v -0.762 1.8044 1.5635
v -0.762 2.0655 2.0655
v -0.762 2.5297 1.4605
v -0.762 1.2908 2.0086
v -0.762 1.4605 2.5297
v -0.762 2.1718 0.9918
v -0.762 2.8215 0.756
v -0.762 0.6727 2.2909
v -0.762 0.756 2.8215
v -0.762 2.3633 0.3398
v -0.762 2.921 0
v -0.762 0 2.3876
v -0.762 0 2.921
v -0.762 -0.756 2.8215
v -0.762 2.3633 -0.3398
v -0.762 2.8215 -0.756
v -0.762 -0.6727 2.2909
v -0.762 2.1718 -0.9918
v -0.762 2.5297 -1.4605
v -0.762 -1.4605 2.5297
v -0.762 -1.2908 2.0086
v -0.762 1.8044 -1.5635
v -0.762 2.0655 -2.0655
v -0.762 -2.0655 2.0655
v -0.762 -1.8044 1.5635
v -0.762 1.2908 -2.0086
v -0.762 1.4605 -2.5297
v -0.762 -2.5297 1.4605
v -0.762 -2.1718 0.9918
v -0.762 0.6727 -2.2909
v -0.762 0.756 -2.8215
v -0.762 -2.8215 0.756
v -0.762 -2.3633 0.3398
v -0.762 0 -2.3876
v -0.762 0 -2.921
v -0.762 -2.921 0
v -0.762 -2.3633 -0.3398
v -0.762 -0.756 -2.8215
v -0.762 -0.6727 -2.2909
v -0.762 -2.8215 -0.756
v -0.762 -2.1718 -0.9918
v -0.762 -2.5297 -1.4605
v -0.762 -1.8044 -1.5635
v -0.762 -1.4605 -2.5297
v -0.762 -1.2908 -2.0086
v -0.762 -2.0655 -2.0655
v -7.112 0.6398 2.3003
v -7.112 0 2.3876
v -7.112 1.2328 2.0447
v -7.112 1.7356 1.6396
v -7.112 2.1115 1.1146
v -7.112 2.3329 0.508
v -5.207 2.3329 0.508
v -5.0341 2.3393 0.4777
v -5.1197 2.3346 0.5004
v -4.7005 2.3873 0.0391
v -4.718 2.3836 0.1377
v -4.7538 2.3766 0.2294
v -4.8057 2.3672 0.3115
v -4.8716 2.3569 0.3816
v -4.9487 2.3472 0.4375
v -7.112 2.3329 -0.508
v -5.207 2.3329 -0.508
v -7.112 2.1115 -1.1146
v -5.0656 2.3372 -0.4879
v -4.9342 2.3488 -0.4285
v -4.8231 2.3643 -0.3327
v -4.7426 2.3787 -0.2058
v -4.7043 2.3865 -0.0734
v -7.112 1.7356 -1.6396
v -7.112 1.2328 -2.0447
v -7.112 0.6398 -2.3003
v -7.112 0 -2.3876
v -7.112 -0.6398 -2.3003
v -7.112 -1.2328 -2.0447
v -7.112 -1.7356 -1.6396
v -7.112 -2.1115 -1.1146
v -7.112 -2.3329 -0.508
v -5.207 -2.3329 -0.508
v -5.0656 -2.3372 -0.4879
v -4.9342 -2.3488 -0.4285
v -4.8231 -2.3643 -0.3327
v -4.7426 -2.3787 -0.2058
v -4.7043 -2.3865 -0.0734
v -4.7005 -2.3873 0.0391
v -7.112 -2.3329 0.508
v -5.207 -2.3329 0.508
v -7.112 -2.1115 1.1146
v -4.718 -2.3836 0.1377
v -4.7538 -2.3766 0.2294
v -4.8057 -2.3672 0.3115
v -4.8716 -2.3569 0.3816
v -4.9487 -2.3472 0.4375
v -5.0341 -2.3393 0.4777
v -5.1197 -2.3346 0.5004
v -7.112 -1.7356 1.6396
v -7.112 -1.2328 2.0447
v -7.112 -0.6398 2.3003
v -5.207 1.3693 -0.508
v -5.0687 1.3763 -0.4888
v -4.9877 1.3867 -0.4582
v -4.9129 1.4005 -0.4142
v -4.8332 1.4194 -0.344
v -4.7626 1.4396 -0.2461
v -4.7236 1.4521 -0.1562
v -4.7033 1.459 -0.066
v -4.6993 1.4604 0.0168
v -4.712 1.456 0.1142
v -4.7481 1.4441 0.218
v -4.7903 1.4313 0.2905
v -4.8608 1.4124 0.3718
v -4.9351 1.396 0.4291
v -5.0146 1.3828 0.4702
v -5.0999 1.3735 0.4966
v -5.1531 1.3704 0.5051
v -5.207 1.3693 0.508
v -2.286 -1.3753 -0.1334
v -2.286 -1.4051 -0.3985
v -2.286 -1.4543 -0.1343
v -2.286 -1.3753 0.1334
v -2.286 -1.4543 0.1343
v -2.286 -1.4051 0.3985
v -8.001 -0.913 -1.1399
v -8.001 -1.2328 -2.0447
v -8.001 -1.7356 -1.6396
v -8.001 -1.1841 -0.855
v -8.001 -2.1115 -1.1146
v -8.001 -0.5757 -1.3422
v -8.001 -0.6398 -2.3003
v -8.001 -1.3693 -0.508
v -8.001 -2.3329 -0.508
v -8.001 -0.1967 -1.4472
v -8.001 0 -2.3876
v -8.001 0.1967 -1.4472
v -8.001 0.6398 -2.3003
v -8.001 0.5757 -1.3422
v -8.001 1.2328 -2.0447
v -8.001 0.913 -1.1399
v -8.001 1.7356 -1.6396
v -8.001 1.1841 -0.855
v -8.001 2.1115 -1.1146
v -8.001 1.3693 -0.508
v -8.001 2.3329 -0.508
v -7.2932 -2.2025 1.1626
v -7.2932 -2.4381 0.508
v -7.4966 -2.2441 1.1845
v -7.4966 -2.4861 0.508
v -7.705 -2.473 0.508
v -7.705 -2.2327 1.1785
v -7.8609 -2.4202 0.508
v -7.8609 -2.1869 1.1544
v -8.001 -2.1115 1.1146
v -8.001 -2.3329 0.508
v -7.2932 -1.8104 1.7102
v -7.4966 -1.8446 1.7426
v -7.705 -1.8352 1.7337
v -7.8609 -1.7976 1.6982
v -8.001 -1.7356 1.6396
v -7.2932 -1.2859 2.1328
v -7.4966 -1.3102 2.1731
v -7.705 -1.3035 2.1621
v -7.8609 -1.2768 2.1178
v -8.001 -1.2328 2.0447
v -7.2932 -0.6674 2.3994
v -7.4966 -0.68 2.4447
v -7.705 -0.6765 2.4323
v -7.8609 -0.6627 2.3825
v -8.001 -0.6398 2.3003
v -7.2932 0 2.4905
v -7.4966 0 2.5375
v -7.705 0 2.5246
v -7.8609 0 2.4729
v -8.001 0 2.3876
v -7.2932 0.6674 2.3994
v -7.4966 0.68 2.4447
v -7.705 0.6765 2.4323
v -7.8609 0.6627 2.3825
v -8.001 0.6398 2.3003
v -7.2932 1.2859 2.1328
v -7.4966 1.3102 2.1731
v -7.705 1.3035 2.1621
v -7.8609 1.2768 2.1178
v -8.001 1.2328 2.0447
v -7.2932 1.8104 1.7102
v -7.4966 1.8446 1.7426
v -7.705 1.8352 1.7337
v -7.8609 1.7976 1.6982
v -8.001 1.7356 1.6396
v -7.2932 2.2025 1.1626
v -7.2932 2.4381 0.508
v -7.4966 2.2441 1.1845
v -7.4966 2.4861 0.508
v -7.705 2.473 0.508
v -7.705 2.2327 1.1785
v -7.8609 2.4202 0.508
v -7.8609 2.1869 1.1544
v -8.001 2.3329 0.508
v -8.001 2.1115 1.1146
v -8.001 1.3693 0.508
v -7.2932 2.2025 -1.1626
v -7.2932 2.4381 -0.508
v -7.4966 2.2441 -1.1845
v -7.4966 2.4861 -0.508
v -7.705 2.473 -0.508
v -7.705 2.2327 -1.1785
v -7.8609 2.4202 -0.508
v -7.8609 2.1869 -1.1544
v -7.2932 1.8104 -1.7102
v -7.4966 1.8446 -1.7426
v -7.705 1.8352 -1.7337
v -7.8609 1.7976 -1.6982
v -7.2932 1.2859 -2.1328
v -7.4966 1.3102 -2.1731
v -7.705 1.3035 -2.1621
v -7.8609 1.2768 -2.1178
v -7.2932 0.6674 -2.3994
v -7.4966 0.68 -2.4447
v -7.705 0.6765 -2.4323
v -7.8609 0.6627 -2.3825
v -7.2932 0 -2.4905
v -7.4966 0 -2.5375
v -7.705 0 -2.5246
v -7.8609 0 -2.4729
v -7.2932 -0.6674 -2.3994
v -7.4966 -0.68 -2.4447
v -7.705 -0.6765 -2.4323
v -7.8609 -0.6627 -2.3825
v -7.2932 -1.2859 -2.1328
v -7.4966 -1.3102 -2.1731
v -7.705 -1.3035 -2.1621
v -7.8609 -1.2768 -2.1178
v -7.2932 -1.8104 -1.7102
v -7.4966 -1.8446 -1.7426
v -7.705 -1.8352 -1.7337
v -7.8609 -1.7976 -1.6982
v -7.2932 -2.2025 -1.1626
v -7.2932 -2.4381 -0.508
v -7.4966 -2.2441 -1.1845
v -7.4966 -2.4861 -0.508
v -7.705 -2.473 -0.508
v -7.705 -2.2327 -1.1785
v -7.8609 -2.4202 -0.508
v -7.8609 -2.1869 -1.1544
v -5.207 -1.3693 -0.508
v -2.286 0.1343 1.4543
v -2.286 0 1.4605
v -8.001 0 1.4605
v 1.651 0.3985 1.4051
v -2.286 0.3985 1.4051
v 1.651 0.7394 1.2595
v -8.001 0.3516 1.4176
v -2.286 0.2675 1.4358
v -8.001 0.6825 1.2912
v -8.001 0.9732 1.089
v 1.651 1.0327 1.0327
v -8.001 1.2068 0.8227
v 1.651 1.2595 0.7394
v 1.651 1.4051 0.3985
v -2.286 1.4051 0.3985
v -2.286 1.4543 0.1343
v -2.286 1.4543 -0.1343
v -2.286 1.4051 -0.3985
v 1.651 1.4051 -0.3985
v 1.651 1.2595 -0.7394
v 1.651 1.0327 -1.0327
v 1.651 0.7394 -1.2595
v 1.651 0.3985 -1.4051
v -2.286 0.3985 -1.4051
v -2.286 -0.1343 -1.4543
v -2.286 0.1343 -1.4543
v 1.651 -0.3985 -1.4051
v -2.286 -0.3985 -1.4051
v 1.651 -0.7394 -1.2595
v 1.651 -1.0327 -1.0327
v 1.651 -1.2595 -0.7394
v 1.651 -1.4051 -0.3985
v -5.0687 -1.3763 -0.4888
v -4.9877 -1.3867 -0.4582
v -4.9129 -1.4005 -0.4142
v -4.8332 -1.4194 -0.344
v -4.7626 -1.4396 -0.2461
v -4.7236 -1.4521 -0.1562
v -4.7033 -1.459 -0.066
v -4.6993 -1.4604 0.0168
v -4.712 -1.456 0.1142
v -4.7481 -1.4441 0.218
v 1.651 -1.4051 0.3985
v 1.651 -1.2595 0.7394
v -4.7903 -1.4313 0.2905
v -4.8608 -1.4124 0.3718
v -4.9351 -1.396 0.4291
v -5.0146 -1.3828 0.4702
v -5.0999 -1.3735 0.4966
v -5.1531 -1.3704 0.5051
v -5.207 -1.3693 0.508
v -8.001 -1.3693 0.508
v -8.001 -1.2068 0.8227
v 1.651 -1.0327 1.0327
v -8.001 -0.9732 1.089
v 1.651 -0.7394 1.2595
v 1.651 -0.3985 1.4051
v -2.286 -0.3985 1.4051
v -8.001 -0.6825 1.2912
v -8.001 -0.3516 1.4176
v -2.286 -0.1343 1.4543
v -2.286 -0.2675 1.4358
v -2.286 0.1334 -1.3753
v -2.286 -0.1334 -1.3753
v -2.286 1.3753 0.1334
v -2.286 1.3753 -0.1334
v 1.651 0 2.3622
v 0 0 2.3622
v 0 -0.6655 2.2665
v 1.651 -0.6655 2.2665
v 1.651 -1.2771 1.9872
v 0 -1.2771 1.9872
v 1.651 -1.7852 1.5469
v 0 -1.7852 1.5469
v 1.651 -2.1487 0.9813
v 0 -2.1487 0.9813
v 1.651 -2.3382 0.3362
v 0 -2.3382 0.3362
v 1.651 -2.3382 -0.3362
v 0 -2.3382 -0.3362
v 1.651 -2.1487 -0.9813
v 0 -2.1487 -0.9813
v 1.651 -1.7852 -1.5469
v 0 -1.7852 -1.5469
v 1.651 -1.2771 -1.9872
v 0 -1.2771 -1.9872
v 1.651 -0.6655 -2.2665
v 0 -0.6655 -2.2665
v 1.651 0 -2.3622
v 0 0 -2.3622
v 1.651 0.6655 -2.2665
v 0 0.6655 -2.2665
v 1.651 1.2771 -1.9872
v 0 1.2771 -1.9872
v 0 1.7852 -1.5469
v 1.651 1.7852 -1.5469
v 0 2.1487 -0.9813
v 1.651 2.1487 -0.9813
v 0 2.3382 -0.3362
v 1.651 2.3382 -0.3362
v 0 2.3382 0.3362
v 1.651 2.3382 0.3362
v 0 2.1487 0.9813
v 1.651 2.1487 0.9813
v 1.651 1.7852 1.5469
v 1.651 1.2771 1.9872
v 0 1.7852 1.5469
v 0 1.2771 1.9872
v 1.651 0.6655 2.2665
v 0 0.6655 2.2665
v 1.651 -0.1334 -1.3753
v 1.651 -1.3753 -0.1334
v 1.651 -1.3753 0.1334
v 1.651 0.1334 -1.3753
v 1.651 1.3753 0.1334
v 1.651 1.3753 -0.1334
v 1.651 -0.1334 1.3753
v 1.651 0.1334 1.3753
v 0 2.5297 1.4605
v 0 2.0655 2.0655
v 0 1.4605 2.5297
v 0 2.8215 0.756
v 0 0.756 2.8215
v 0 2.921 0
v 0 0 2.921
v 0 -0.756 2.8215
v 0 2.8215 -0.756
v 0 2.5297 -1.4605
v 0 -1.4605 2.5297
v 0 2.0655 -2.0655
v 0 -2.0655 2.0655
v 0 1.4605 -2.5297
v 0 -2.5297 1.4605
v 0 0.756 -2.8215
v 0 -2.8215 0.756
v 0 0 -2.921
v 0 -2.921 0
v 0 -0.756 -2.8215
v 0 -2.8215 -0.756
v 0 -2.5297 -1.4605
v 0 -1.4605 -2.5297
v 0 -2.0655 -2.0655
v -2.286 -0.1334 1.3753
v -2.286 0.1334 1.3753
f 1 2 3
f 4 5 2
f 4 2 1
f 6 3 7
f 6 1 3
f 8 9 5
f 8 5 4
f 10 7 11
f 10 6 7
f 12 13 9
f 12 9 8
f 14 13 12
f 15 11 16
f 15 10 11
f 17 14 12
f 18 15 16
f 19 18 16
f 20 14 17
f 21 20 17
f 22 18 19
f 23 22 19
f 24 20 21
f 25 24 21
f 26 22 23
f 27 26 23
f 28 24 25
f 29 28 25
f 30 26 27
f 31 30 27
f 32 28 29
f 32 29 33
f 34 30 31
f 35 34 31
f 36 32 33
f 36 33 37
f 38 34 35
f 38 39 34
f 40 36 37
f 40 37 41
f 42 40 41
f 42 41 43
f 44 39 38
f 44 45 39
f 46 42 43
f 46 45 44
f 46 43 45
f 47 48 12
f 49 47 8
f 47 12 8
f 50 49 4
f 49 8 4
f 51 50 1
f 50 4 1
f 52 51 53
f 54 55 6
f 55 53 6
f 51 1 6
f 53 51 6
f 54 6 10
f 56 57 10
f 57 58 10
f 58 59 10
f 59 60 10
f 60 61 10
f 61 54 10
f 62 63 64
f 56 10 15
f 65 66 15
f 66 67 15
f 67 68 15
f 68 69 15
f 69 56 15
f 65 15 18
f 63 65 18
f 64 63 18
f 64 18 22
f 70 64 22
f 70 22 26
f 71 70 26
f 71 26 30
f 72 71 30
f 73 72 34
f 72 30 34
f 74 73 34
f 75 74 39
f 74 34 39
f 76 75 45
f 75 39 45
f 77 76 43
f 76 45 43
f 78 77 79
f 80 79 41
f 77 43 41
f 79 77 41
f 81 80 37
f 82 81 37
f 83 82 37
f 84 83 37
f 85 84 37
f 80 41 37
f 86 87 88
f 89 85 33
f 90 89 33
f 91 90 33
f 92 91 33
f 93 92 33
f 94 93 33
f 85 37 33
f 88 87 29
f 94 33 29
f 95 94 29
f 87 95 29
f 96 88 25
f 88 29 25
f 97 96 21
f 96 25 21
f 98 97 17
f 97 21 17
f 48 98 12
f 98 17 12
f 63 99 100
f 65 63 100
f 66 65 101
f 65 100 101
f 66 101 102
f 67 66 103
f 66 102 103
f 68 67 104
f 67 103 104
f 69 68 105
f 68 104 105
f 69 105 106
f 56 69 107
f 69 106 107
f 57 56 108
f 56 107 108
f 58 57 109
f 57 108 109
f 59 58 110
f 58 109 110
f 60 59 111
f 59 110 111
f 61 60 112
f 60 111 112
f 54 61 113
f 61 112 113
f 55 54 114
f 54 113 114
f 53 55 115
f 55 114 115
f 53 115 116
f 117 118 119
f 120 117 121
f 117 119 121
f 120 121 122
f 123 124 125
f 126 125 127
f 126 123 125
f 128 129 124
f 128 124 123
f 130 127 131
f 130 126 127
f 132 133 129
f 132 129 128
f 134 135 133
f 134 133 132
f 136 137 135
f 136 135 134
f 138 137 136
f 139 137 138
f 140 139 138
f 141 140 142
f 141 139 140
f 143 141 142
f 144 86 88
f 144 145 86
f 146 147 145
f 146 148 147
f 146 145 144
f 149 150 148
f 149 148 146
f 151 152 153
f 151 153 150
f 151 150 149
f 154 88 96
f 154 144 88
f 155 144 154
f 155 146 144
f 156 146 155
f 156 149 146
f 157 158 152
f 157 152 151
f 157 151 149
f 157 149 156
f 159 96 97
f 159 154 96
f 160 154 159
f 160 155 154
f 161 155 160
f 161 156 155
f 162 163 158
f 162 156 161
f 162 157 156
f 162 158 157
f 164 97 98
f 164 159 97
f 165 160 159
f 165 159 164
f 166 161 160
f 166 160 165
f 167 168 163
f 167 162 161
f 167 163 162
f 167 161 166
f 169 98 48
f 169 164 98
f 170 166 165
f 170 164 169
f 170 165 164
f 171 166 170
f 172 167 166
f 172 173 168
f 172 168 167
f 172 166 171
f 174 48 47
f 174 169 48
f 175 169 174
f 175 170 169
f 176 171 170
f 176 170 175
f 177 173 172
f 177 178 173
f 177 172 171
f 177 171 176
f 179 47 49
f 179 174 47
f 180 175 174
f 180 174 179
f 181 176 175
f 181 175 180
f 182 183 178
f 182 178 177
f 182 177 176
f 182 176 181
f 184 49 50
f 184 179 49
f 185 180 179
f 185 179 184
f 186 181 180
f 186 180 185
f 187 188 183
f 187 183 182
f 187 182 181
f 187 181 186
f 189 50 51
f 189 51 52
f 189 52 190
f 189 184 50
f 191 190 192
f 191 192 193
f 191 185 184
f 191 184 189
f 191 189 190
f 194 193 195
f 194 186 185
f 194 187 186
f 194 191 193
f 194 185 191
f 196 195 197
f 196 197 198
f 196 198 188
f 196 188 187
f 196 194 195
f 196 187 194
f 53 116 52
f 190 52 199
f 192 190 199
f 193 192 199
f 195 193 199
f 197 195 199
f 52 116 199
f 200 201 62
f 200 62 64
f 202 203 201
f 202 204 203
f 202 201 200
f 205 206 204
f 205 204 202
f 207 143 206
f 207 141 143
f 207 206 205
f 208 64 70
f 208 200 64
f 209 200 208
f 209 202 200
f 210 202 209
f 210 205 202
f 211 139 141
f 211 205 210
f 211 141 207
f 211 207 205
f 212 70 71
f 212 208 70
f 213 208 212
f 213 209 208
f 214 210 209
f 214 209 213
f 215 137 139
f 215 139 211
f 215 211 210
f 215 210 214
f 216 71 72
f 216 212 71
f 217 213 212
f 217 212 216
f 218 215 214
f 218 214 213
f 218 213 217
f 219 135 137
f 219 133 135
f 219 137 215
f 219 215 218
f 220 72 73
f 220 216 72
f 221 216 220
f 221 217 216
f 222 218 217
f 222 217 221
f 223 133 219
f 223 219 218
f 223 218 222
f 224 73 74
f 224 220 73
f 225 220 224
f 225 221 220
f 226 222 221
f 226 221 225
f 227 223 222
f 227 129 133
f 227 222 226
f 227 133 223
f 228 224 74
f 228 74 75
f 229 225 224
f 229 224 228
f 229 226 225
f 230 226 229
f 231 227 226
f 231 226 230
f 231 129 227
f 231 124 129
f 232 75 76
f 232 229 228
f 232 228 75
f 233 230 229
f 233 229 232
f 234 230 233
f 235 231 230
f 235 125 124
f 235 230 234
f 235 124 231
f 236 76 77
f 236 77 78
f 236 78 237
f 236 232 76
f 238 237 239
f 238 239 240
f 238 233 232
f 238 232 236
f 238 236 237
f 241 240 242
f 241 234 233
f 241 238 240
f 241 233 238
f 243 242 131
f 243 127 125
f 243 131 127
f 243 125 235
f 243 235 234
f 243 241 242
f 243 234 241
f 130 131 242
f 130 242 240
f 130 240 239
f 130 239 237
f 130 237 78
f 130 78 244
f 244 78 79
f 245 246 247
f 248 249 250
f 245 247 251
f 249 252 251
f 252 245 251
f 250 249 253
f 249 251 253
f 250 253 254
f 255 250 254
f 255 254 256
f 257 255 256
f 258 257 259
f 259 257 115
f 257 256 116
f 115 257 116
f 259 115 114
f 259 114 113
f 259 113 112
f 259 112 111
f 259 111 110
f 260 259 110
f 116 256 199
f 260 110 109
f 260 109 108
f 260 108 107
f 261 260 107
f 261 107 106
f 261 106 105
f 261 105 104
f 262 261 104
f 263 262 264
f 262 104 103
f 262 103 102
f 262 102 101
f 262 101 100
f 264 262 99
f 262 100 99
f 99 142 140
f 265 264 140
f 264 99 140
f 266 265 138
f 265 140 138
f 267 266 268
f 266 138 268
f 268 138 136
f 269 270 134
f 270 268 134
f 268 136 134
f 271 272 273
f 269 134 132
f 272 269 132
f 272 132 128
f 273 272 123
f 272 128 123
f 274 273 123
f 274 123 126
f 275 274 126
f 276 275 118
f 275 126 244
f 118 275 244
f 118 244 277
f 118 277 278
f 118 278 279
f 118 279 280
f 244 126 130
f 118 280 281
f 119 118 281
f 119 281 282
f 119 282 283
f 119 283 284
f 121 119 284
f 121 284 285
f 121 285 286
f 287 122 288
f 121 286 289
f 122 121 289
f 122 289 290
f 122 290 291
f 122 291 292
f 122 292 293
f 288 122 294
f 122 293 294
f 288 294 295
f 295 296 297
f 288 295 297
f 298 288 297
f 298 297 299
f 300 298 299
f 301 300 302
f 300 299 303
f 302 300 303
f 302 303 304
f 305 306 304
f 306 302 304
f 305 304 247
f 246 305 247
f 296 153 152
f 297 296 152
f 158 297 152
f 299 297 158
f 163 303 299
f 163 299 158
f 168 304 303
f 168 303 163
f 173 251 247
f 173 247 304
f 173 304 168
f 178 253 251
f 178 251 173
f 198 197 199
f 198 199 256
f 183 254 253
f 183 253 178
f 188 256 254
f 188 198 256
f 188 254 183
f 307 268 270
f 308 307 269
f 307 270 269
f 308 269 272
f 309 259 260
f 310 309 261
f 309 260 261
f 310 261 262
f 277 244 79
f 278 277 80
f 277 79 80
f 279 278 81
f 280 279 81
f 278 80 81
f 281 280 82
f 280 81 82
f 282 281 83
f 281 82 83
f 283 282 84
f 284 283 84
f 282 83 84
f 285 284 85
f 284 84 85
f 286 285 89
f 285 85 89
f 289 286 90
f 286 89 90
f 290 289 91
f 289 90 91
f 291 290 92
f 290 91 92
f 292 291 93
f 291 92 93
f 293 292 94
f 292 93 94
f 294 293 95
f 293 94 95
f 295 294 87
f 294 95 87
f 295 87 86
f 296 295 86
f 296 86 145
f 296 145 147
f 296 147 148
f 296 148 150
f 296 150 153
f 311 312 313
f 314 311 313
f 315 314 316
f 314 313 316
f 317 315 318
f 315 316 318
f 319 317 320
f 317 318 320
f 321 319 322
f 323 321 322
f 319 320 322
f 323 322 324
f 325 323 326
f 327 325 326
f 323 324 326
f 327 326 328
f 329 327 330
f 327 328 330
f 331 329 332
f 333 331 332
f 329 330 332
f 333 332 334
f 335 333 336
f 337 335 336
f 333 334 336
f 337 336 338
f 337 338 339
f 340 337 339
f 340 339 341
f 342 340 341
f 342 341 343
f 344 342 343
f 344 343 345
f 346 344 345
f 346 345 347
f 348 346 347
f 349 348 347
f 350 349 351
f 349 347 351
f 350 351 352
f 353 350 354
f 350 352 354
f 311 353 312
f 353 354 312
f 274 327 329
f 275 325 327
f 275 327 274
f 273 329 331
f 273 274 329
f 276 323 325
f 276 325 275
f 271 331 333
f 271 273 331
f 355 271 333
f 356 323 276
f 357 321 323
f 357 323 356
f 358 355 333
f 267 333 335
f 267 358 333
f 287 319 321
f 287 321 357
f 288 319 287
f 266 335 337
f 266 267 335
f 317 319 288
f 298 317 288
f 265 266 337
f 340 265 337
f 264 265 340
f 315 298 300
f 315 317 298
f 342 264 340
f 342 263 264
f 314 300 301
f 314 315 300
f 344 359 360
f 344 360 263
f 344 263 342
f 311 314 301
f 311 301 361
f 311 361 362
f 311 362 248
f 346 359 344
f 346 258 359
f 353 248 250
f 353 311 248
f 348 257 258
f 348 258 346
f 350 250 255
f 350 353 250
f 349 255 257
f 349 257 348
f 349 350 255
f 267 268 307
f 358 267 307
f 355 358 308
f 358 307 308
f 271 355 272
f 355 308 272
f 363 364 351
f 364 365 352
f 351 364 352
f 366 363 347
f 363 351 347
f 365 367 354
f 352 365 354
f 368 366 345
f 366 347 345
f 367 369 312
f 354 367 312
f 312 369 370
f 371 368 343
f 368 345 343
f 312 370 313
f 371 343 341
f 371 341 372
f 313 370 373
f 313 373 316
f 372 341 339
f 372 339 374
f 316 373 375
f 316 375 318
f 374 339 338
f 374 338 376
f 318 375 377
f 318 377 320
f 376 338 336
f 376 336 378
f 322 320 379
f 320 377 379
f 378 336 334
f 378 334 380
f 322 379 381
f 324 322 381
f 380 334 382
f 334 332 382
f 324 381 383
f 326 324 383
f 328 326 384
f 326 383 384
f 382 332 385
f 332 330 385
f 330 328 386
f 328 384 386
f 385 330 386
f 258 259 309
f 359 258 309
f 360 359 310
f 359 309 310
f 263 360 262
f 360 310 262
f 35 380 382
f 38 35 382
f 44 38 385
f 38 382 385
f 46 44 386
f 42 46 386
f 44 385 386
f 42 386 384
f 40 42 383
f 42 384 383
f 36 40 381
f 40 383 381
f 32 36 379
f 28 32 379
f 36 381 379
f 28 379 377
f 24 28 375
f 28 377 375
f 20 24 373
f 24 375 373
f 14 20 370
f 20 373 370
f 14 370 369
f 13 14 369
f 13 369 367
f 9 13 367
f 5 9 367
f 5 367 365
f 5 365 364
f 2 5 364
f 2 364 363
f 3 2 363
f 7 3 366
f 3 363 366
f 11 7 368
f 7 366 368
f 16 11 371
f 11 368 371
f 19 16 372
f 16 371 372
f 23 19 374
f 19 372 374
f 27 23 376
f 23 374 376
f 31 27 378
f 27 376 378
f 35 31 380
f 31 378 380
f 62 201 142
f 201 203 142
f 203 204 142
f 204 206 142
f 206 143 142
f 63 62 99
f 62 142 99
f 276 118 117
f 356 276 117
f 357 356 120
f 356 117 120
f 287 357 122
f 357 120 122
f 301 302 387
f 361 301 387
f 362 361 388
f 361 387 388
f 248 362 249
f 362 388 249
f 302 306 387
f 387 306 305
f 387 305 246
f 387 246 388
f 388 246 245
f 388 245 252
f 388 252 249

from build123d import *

# Parameters (mm, degrees)
SKETCH1_R               = 2.3622
BASE_EXTRUDE_DEPTH      = 1.651
SKETCH3_R               = 2.921
BOSS_EXTRUDE1_DEPTH     = 0.762
SKETCH4_R               = 2.3876
BOSS_EXTRUDE2_DEPTH     = 7.239
SKETCH7_R               = 1.4605
CUT_EXTRUDE2_DEPTH      = 11.498837364
CUT_EXTRUDE4_DEPTH      = 10.004470257
CUT_EXTRUDE4_DEPTH_BACK = 10.004470257
BOSS_EXTRUDE11_START    = -3.937
BOSS_EXTRUDE11_DEPTH    = 3.937
CIRPATTERN1_COUNT       = 4


with BuildPart() as part:
    # Sketch1 → Base-Extrude (new body)
    with BuildSketch(Plane(origin=(0, 0, 0), x_dir=(0, 0, -1), z_dir=(1, 0, 0))):
        with Locations(Location((0, 0, 0), (0, 0, 180))):
            Circle(SKETCH1_R)
    extrude(amount=BASE_EXTRUDE_DEPTH)

    # Sketch3 → Boss-Extrude1 (add)
    with BuildSketch(Plane.ZY):
        with Locations(Location((0, 0, 0), (0, 0, 180))):
            Circle(SKETCH3_R)
    extrude(amount=BOSS_EXTRUDE1_DEPTH)

    # Sketch4 → Boss-Extrude2 (add)
    with BuildSketch(Plane.ZY.offset(0.762)):
        Circle(SKETCH4_R)
    extrude(amount=BOSS_EXTRUDE2_DEPTH)

    # Sketch6 → Boss-Revolve2 (revolve)
    with BuildSketch(Plane(origin=(0, 0, 0), x_dir=(1, 0, 0), z_dir=(0, 1, 0)), mode=Mode.PRIVATE) as boss_revolve2_sk:
        with BuildLine():
            Line((-8.001, 2.3876), (-7.112, 2.3876))
            ThreePointArc((-7.112, 2.3876), (-7.5565, 2.54), (-8.001, 2.3876))
        make_face()
    revolve(boss_revolve2_sk.sketch.rotate(Axis((0, 0, 0), (-1, 0, 0)), 180), axis=Axis((0, 0, 0), (-1, 0, 0)))

    # Sketch7 → Cut-Extrude2 (cut, through all)
    with BuildSketch(Plane.ZY.offset(8.001)):
        Circle(SKETCH7_R)
    extrude(amount=-CUT_EXTRUDE2_DEPTH, mode=Mode.SUBTRACT)

    # Sketch8 → Cut-Extrude4 (cut, two sides: drawn at the far end of the back side and taken through both)
    with BuildSketch(Plane(origin=(0, 0, 0), x_dir=(1, 0, 0), z_dir=(0, 1, 0)).offset(-CUT_EXTRUDE4_DEPTH_BACK)):
        with BuildLine():
            Line((-8.001, 0.508), (-5.207, 0.508))
            ThreePointArc((-5.207, 0.508), (-4.699, 0), (-5.207, -0.508))
            Line((-5.207, -0.508), (-8.001, -0.508))
            Line((-8.001, -0.508), (-8.001, 0.508))
        make_face()
    extrude(amount=CUT_EXTRUDE4_DEPTH + CUT_EXTRUDE4_DEPTH_BACK, mode=Mode.SUBTRACT)

    # Sketch11 → Boss-Extrude11 (add)
    with BuildSketch(Plane(origin=(1.651, 0, 0), x_dir=(0, 0, -1), z_dir=(1, 0, 0)).offset(BOSS_EXTRUDE11_START)):
        with BuildLine():
            ThreePointArc((0.39848324, 1.405087669), (0, 1.4605), (-0.39848324, 1.405087669))
            ThreePointArc((-0.39848324, 1.405087669), (0, 1.3716), (0.39848324, 1.405087669))
        make_face()
    boss_extrude11 = extrude(amount=BOSS_EXTRUDE11_DEPTH)

    # CirPattern1: Boss-Extrude11 ×4 about axis
    cirpattern1_axis = Axis((0, 0, 0), (1, 0, 0))
    for i in range(1, CIRPATTERN1_COUNT):
        add(boss_extrude11.rotate(cirpattern1_axis, i * 360 / CIRPATTERN1_COUNT))


solid = part.part
